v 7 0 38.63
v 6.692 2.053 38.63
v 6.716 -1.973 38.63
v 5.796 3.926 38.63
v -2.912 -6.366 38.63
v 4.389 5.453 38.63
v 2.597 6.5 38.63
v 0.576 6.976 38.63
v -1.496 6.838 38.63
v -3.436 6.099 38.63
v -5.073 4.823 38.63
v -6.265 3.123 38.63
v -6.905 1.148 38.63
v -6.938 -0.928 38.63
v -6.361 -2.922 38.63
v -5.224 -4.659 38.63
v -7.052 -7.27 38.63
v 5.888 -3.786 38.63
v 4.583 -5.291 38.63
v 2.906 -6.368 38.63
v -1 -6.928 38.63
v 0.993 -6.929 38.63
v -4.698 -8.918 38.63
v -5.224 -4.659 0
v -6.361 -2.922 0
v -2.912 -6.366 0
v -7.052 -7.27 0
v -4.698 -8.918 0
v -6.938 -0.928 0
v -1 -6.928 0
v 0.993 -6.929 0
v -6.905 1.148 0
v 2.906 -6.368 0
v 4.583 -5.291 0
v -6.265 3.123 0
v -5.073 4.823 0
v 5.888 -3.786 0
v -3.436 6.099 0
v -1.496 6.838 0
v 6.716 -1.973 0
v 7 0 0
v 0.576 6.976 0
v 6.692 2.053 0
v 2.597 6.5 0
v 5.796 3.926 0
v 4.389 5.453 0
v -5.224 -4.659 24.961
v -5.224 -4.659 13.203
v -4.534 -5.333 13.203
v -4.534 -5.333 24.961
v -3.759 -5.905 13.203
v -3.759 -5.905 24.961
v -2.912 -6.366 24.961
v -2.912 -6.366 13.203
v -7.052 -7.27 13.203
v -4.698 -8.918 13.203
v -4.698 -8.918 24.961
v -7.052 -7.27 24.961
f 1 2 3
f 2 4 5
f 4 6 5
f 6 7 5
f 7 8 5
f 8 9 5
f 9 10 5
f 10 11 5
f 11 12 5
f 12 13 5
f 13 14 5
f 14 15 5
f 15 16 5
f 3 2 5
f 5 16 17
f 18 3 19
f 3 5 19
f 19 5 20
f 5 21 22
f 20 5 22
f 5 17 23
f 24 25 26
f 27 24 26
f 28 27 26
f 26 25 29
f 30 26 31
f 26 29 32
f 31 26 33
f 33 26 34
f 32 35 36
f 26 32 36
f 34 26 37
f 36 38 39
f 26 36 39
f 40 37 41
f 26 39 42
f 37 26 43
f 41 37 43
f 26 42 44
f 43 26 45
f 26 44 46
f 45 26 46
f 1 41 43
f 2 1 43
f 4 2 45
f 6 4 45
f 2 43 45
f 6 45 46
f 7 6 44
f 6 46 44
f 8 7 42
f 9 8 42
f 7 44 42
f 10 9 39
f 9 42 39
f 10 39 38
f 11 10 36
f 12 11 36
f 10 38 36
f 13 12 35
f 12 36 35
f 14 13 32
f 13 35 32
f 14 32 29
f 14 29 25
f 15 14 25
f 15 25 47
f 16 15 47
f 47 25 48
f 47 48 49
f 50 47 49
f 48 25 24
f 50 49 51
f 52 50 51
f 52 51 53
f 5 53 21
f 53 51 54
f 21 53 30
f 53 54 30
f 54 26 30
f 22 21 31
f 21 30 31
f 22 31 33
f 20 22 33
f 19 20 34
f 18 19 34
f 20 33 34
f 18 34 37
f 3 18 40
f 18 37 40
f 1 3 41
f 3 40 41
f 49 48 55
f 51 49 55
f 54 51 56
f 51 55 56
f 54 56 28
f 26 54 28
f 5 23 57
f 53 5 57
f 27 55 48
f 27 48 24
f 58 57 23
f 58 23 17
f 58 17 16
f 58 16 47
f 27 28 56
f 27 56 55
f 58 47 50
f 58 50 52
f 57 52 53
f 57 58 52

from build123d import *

# Parameters (mm, degrees)
SKETCH1_R             = 7
BOSS_EXTRUDE1_DEPTH   = 38.63
SKETCH2_W             = 2.872896842
SKETCH2_H             = 13.203310437
BOSS_EXTRUDE2_DEPTH   = 3
SKETCH2_H_2           = 13.668710778
BOSS_EXTRUDE2_2_DEPTH = 3
SKETCH3_W             = 2.872896842
SKETCH3_H             = 13.668710778
SKETCH3_H_2           = 13.203310437
BOSS_EXTRUDE3_DEPTH   = 10


with BuildPart() as part:
    # Sketch1 → Boss-Extrude1 (new body)
    with BuildSketch(Plane.XY):
        Circle(SKETCH1_R)
    extrude(amount=BOSS_EXTRUDE1_DEPTH)



with BuildPart() as body_2:
    # Sketch2 → Boss-Extrude2 (new body)
    with BuildSketch(Plane(origin=(-4.013864175, -5.73488399, 0), x_dir=(-0.819269141, 0.573409168, 0), z_dir=(-0.573409168, -0.819269141, 0))):
        with Locations((0.171883624, -6.601655219)):
            Rectangle(SKETCH2_W, SKETCH2_H)
    extrude(amount=BOSS_EXTRUDE2_DEPTH)


with BuildPart() as body_3:
    # Sketch2 → Boss-Extrude2 2 (new body)
    with BuildSketch(Plane(origin=(-4.013864175, -5.73488399, 0), x_dir=(-0.819269141, 0.573409168, 0), z_dir=(-0.573409168, -0.819269141, 0))):
        with Locations((0.171883624, -31.795644611)):
            Rectangle(SKETCH2_W, SKETCH2_H_2)
    extrude(amount=BOSS_EXTRUDE2_2_DEPTH)


with BuildPart() as part_1:
    add(part.part)

    add(body_2.part)  # Boss-Extrude3 merges body 2

    add(body_3.part)  # Boss-Extrude3 merges body 3
    # Sketch3 → Boss-Extrude3 (add)
    with BuildSketch(Plane(origin=(-4.013864175, -5.73488399, 0), x_dir=(0.819269141, -0.573409168, 0), z_dir=(0.573409168, 0.819269141, 0))):
        with Locations((-0.171883624, -31.795644611)):
            Rectangle(SKETCH3_W, SKETCH3_H)
        with Locations((-0.171883624, -6.601655219)):
            Rectangle(SKETCH3_W, SKETCH3_H_2)
    extrude(amount=BOSS_EXTRUDE3_DEPTH)


solid = part_1.part
